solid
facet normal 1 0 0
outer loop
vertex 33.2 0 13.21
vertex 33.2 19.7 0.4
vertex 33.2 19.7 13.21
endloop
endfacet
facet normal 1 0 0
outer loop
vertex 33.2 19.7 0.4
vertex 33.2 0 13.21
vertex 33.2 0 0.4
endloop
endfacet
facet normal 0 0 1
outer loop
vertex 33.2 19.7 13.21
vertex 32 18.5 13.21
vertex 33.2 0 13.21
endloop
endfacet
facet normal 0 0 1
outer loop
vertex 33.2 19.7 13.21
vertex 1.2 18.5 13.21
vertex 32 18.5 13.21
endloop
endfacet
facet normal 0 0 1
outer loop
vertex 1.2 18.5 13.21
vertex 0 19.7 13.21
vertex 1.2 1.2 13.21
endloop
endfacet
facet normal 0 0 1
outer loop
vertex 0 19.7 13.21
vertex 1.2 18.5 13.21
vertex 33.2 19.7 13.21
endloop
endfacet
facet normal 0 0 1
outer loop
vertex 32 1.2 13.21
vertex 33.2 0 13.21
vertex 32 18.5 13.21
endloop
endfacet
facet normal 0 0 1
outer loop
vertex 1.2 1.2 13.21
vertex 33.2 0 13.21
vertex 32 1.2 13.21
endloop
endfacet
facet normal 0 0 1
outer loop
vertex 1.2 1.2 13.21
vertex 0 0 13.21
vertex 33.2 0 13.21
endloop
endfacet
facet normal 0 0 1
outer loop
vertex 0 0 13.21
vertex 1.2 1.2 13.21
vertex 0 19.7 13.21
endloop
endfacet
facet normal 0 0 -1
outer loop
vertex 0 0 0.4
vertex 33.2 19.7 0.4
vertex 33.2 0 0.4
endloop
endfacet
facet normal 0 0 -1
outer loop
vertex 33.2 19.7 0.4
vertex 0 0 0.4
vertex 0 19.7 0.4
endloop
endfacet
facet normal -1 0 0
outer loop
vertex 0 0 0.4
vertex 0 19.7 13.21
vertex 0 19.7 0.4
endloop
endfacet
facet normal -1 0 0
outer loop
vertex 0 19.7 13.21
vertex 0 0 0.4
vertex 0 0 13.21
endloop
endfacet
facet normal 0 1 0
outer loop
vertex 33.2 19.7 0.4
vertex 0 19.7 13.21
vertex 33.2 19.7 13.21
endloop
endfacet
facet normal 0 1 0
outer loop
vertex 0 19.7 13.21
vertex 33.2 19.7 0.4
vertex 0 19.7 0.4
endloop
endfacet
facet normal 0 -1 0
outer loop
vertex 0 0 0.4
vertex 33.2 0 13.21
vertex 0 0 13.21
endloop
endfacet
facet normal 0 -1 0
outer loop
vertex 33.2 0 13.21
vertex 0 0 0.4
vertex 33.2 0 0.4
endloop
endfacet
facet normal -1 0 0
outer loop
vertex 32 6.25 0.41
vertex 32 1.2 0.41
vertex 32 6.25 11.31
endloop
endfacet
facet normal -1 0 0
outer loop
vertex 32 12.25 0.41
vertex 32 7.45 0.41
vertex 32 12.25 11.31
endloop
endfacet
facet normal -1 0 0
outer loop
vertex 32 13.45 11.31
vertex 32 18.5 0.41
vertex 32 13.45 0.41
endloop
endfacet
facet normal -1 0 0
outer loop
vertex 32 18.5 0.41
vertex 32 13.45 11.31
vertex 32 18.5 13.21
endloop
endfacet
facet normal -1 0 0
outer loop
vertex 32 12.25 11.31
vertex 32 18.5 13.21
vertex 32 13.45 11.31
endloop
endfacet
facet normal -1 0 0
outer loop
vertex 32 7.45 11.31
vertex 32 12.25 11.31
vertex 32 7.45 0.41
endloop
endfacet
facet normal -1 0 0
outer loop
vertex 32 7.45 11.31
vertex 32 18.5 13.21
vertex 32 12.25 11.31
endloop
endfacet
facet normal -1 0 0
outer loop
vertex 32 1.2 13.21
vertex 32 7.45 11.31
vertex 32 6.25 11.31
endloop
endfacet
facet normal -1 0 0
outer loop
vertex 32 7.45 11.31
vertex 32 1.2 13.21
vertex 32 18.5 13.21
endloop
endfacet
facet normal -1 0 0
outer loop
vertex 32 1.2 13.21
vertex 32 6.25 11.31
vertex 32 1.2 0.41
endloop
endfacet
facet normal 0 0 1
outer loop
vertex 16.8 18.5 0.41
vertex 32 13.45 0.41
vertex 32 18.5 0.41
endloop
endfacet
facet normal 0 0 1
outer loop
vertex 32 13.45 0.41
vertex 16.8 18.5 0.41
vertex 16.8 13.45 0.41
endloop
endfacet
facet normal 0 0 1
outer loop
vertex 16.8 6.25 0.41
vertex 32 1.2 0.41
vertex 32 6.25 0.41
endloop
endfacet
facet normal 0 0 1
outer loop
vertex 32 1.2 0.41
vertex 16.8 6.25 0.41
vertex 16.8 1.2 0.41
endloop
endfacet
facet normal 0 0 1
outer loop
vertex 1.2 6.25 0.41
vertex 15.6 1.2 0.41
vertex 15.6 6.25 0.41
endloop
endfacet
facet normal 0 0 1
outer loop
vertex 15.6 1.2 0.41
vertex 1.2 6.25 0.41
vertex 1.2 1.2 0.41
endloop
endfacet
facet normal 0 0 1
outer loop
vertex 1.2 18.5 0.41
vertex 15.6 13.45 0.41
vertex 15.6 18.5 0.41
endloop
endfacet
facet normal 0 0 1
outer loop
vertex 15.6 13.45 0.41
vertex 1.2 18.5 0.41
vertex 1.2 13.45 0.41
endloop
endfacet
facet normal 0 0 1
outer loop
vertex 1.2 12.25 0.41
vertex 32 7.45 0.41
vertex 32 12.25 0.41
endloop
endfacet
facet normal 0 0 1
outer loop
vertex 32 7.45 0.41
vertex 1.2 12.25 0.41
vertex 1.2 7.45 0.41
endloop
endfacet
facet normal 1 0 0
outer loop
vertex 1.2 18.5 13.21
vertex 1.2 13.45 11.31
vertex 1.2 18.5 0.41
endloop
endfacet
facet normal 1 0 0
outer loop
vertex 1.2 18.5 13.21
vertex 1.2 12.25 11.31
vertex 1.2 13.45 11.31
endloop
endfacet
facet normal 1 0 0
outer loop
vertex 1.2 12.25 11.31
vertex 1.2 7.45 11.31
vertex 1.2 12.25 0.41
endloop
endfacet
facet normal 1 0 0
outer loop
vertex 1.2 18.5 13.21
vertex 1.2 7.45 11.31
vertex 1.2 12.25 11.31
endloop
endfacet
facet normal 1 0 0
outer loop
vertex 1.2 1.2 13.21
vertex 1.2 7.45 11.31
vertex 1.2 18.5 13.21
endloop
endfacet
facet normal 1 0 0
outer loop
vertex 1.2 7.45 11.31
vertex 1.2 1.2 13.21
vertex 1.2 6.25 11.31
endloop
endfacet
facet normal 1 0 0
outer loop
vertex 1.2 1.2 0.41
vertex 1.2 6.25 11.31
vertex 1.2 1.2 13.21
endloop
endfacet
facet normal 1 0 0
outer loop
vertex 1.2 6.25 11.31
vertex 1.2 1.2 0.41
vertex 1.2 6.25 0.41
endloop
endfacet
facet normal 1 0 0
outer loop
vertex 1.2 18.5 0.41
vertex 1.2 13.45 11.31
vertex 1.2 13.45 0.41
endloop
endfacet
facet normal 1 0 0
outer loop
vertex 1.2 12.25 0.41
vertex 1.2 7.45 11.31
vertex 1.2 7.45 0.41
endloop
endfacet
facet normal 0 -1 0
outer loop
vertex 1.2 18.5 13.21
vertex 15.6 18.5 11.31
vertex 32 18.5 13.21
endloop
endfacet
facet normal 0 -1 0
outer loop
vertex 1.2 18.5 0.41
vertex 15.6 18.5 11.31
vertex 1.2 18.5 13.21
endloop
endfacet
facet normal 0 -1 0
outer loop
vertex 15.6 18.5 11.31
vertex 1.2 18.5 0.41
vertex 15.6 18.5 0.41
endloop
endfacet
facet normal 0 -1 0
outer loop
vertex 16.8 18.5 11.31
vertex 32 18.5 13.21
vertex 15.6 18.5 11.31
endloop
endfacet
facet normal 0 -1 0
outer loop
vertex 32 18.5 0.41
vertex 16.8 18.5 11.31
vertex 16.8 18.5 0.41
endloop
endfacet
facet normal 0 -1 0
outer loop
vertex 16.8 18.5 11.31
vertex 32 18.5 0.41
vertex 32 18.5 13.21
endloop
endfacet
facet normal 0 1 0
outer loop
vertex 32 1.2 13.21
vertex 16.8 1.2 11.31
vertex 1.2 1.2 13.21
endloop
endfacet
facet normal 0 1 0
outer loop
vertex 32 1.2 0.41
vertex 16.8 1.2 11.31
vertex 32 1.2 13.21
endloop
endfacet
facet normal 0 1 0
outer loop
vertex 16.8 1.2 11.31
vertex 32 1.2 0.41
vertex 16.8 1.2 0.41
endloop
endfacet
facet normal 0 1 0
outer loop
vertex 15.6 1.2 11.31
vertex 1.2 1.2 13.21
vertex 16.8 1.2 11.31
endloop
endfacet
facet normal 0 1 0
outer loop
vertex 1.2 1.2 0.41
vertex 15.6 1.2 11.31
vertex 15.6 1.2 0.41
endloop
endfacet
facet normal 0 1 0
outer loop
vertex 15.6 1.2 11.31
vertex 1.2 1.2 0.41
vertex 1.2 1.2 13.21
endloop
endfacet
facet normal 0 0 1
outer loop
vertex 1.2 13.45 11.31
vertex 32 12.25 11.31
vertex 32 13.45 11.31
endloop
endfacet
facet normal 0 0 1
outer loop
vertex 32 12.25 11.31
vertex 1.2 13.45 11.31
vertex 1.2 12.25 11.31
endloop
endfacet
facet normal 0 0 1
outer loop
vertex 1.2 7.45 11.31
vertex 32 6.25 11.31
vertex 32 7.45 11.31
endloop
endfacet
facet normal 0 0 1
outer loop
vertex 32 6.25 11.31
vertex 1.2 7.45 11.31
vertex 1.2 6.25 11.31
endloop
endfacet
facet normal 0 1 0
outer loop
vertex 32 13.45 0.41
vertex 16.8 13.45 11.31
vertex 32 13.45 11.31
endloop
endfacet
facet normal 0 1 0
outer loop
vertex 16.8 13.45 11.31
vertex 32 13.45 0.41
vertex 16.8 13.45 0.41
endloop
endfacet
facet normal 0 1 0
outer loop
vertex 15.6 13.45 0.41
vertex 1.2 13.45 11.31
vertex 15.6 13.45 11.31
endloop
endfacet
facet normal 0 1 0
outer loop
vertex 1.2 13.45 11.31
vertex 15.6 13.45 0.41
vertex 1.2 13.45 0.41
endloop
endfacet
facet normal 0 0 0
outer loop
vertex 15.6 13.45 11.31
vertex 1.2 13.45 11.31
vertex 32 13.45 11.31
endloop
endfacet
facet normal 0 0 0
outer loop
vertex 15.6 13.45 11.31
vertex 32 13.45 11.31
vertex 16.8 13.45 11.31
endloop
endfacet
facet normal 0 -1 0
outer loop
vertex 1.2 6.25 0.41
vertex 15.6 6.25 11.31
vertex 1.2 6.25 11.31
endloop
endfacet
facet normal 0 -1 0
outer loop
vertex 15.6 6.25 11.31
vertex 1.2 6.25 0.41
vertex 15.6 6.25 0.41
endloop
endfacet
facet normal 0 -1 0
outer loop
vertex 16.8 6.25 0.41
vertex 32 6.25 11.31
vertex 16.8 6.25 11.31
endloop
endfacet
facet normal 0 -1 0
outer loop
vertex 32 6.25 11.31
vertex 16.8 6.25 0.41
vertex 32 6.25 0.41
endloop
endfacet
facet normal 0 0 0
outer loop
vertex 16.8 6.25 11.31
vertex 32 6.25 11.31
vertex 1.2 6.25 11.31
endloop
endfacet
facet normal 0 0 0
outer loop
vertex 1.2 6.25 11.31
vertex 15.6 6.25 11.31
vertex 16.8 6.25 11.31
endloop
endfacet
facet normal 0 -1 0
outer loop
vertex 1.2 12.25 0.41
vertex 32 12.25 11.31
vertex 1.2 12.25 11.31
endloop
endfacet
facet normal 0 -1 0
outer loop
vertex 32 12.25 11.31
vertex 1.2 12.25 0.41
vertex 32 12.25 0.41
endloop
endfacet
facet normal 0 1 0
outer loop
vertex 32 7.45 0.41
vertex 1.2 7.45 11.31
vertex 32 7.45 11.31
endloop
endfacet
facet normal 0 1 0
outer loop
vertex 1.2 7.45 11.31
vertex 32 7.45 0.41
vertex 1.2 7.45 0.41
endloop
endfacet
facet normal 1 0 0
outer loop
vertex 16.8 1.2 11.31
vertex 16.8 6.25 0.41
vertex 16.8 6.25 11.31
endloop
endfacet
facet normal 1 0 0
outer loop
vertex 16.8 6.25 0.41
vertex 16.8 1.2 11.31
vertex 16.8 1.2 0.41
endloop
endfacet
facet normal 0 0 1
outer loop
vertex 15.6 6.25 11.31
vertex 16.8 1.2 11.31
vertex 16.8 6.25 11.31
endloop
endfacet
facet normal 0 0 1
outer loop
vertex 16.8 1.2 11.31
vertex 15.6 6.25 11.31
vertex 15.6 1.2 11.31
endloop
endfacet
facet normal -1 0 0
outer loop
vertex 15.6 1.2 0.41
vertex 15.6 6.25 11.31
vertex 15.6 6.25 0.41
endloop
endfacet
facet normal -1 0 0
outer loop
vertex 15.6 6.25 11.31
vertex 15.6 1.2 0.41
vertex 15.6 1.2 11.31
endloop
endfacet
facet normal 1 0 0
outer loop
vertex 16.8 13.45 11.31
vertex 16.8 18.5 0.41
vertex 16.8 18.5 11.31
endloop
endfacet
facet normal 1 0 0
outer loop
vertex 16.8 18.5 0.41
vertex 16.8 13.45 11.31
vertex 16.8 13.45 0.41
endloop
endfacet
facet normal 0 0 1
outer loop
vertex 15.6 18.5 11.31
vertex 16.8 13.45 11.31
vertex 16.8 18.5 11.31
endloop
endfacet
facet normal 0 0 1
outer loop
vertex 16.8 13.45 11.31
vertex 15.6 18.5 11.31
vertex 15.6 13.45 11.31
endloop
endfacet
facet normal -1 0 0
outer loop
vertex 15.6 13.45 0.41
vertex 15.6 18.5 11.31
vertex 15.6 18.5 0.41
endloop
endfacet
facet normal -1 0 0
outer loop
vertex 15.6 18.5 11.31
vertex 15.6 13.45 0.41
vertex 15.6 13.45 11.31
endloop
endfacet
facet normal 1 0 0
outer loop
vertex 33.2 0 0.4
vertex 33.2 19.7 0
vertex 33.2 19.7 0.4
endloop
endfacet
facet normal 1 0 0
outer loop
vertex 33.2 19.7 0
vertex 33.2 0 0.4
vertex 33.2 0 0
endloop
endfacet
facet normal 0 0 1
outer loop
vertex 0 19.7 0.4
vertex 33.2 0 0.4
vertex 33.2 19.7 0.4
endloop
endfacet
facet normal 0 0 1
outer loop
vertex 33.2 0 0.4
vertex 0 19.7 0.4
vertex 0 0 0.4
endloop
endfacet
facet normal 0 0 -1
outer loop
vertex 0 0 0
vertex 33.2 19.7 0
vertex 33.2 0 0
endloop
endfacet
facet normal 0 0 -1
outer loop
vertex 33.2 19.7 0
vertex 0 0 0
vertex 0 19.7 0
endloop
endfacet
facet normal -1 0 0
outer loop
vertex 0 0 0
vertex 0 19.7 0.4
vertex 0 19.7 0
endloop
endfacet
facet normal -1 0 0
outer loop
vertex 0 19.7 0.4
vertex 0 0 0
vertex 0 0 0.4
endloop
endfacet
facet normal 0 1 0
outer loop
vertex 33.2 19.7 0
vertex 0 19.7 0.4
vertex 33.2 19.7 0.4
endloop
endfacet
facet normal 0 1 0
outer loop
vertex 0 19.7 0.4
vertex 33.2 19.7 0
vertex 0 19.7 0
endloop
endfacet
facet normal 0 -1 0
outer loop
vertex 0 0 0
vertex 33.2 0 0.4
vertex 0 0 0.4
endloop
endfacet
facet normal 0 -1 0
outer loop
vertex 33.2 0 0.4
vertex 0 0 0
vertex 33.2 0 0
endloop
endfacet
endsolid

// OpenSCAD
// file: ../../Base/Boxes.scad
// Fischertechnik Box Foundation
// Pre-designed Boxes

use <Constants.scad>

include <PlacementOptions.scad>

box190Width = 190;
box190Depth = 130;
box130Width = 130;
box130Depth = 95;
boxUsageHeight = 33.9;
boxWallThickness = 2.4;
boxBaseThickness = 1.0;
boxWebWidth = 3.0;

// getBoxWallThickness()
// Gets the wall thickness of a Fischertechnik Box

function getBoxWallThickness() = boxWallThickness;

// Gets the usable height of a fischertechnik box
function getBoxUsageHeight() = boxUsageHeight;

// Gets the thickness of the Fischertechnik box base.
function getBoxBaseThickness() = boxBaseThickness;

// Gets the width of a box web
function getBoxWebWidth() = boxWebWidth;

// Gets the usable inner space of a Box 190 as an x/y-list
function getBox190Space() = [
    box190Width - 2*getBoxWallThickness(), 
    box190Depth - 2*getBoxWallThickness() ];

// Imports the Fischertechnik empty box 130x190 mm and places it at position 0,0
// 190x130 are the outer sizes, the inner space is slightly smaller. Use getBox190Space() to get the inner sizes.
// This module needs the STL file "Fischertechnik Box 130x190.stl" in the library path.
// The box is positioned that the usable inner space is at the 0,0,0 position. The

module Box190() {
    translate([-getBoxWallThickness(),-getBoxWallThickness(),-getBoxBaseThickness()])
        import("Fischertechnik Box 130x190.stl", convexity=3);
}

// Gets the usable inner space of a Box 130 as an x/y-list
function getBox130Space() = [
    box130Width - 2*getBoxWallThickness(), 
    box130Depth - 2*getBoxWallThickness() ];

// Imports the Fischertechnik empty box 95x130 mm and places it at position 0,0
// 190x130 are the outer sizes, the inner space is slightly smaller. Use getBox190Space() to get the inner sizes.
// This module needs the STL file "Fischertechnik Box 95x130.stl" in the library path.
// The box is positioned that the usable inner space is at the 0,0,0 position. The

module Box130() {
    translate([-getBoxWallThickness(),-getBoxWallThickness(),-getBoxBaseThickness()])
        import("Fischertechnik Box 95x130.stl", convexity=3);
}

// Creates a web at the specified box walls
// corner 0 = LowerLeft, 1 = UpperLeft, 2 = UpperRight, 3 = LowerRight
// side 0 = LeftOfCorner, 1 = RightOfCorner
// distance = Distance in mm from the corner
// box = inner width and depth of the box (default: Box 190)
// webWidth = length of the web (default is 3 mms)
// webThickness = thickness of the web (default is 1 mm)

module BoxWeb(corner, side, distance, box=getBox190Space(), webWidth=getBoxWebWidth(), webThickness=1.0) {
    sink = getBoxWallThickness()/2;

    width = (corner % 2 == 0) ? 
            (side == LeftOfCorner ? webWidth : webThickness) :
            (side == LeftOfCorner ? webThickness : webWidth);

    depth = (corner % 2 == 0) ? 
            (side == RightOfCorner ? webWidth : webThickness) :
            (side == RightOfCorner ? webThickness : webWidth);
    
    xDiff = corner == LowerLeft ? 
                (side == LeftOfCorner ? -sink : distance) :
            (corner == UpperLeft ?                
                (side == LeftOfCorner ? distance : -sink) :
            (corner == UpperRight ?
                (side == LeftOfCorner ? box.x-webWidth+sink : box.x-distance-webThickness) :
                (side == LeftOfCorner ? box.x-distance-webThickness: box.x-webWidth+sink)));

    yDiff = corner == LowerLeft ? 
                (side == RightOfCorner ? -sink : distance) :
            (corner == UpperLeft ?
                (side == RightOfCorner ? box.y-distance : box.y-webWidth+sink) :
            (corner == UpperRight ?
                (side == RightOfCorner ? box.y-webWidth+sink : box.y-distance) :
                (side == RightOfCorner ? distance : -sink)));
    
    translate([xDiff, yDiff, -getExcess()])
        cube([width, depth, boxUsageHeight + 2*getExcess()]);
}
// file: ../../Base/Rotation.scad
// Fischertechnik Box Foundation
// Geometry Helpers Rotation

include <PlacementOptions.scad>

// getRotatedSpace(space, rotation=NoRotation)
// Rotates the space dependent on the specified rotation

function getRotatedSpace(space, rotation=NoRotation) = [
    (rotation == Rotate90 || rotation == Rotate270) ? space.y : space.x,
    (rotation == Rotate90 || rotation == Rotate270) ? space.x : space.y
];

// Rotates the given space around the fixed left lower corner
// space = the space the children needs as width/depth list [width,depth]
// rotation = 0 Rotate0 degrees, 1 Rotate90 degrees, 2 Rotate180 degrees, 3 Rotate270 degrees (equivalent to -90)

module RotateFix(space, rotation=Rotate0) {
    dy = (rotation == Rotate0 || rotation == Rotate270) ? 0 :
        (rotation == Rotate90) ? space.x :
        space.y;
    dx = (rotation < Rotate180) ? 0 :
        (rotation == Rotate180) ? space.x :
        space.y;
    
    translate([dx, dy, 0])
        rotate([0, 0, rotations[rotation]])
            children();
}
// file: ../../Base/Alignment.scad
// Fischertechnik Box Foundation
// Geometry Helpers Alignment

include <PlacementOptions.scad>

// getAlignedX(elementWidth, spaceWidth, align=AlignRight, offset=0)
// Gets the aligned X offset of an element with the given
// width in the given space.
// elementWidth = The width of the element to positon
// spaceWidth = The space where the element should be aligned
// align = 0 AlignLeft, 1 AlignCenter, 2 AlignRight
// offset = an optional offset from the aligned position. When
// aligned left or centered, then positive values are in X direction.
// When aligned right then positive values are in negative X direction.

function getAlignedX(elementWidth, spaceWidth, align=AlignRight, offset=0) =
    (align == AlignLeft) ?
        offset :
        ((align == AlignCenter) ?
        (spaceWidth - elementWidth)/2 + offset :
        spaceWidth - offset - elementWidth);

// getAlignedY(elementDepth, spaceDepth, align=AlignTop, offset=0)
// Gets the aligned Y offset of an element with the given
// depth in the given space.
// elementDepth = The depth of the element to positon
// spaceDepth = The space where the element should be aligned
// align = 0 AlignBottom, 1 AlignCenter, 2 AlignTop
// offset = an optional offset from the aligned position. When
// aligned bottom or centered, then positive values are in Y direction.
// When aligned top then positive values are in negative Y direction.

function getAlignedY(elementDepth, spaceDepth, align=AlignTop, offset=0) =
    (align == AlignBottom) ?
        offset :
        ((align == AlignCenter) ?
        (spaceDepth - elementDepth)/2 + offset :
        spaceDepth - offset - elementDepth);
// file: ../../Base/PlacementOptions.scad
// Fischertechnik Box Foundation
// Placement Options

// Alignment
NoAlign = 0;
AlignLeft = 1;
AlignBottom = 2;
AlignCenter = 3;
AlignRight = 4;
AlignTop = 5;

// Element rotation degree steps
rotations = [0, -90, -180, -270];

// Rotation
NoRotation = 0;
Rotate0 = 0;
Rotate90 = 1;
Rotate180 = 2;
Rotate270 = 3;

// Docking (seen from above)
NoDock = -1;
DockLeft = 0;
DockTop = 1;
DockRight = 2;
DockCorner = 2;
DockBottom = 3;

// Web corners
LowerLeft = 0;
UpperLeft = 1;
UpperRight = 2;
LowerRight = 3;

// Web position relative to corner
LeftOfCorner = 0;
RightOfCorner = 1;
// file: ../../Base/Placement.scad
// Fischertechnik Box Foundation
// Geometry Helpers Placement

use <Constants.scad>
use <Alignment.scad>
use <Rotation.scad>
use <Boxes.scad>

include <PlacementOptions.scad>

// Place(x=0, y=0, elementSpace=[0,0], alignX=AlignLeft, alignY=AlignBottom, rotation=Rotate0, boxSpace=getBox190Space())
// Places the child at the specified position
// y = Y-Position. This is a relative position when an X aligment is specified.
// x = X-Position. This is a relative position when an Y aligment is specified.
// elementSpace = space of the element to be placed [x,y]
// alignX = -1=NoAlign, 0 AlignLeft, 1 AlignCenter, 3 AlignRight (elementSpace and boxSpace required!)
// alignY = -1=NoAlign, 2 AlignBottom, 1 AlignCenter, 4 AlignTop (elementSpace and boxSpace required!)
// rotation = 0 Rotate0 0 degrees, 1 Rotate90 90 degrees, 
// 2 Rotate180 180 degrees, 3 Rotate270 270 degrees (equivalent to -90)
// boxSpace = Inner space of the box where the placement occurs [x,y] - default is Box 190x130 inner space

module Place(x=0, y=0, elementSpace=[0,0], 
  alignX=AlignLeft, alignY=AlignBottom, 
  rotation=NoRotation, boxSpace=getBox190Space()) {

    module Position(x, y, space, rotation=Rotate0) {
        translate([x, y, 0])
            RotateFix(space, rotation)
                children();
    }

    space = getRotatedSpace(elementSpace, rotation);
    alignedX = getAlignedX(space.x, boxSpace.x, alignX, x);
    alignedY = getAlignedY(space.y, boxSpace.y, alignY, y);
    Position(alignedX, alignedY, elementSpace, rotation)
        children();
}

// Center(space=getBox130Space(), elementSpace=[0,0])
// space = Space where the children is centered. For cylinder use centered=true and no elementSpace.
// elementSpace = space of the element to be centered [x,y]

module Center(space=getBox190Space(), elementSpace=[0,0]) {
    translate([(space.x - elementSpace.x) / 2, (space.y - elementSpace.y) / 2])
        children(0);
}

// CenterHorizontal(width=0, y=0, offset=0, space=getBox130Space())
// space = Space where the children is centered. For cylinder use centered=true and no elementSpace.
// elementSpace = space of the element to be centered [x,y]

module CenterHorizontal(width=0, y=0, offset=0, space=getBox190Space()) {
    translate([(space.x - width) / 2 + offset, y])
        children(0);
}

// CenterVertical(depth=0, x=0, offset=0, space=getBox130Space())
// space = Space where the children is centered. For cylinder use centered=true and no elementSpace.
// elementSpace = space of the element to be centered [x,y]

module CenterVertical(depth=0, x=0, offset=0, space=getBox190Space()) {
    translate([x, (space.y - depth) / 2 + offset])
        children(0);
}
// file: ../../Elements/AxisClip10.scad
// Fischertechnik Box Library
// Axis for clip 10
// 31023

use <../ModelBase/Simple.scad>

width = 12;
depth = 12;
height = 23;

// getAxisClip10Space()
// Gets the space of a frame for a clip 10 with spring ring (mot2)

function getAxisClip10Space() = [width, depth, height];

// AxisClip10()
// Axis for clip 10 with spring ring (mot2)

module AxisClip10() {
    LeveledAxisWithSpace(height, height-10, getAxisClip10Space());
}

// Tests
color("lightgray")
AxisClip10();
// file: ../../Base/Constants.scad
// Fischertechnik Box Foundation
// Constants

// Constant values necessary for multiple elements

// Base constants
dividerThickness = 1.2;
excess = 0.01;
fragments = 90;
tolerance = 0.8;

// Gets the thickness of a divider 
function getDividerThickness() = dividerThickness;

// Gets the excess that is used to merge walls into each other
function getExcess() = excess;

// Gets amount of fragments of a cylinder
function getFragments() = fragments;

// Gets the inner tolerance of a frame to each side
function getTolerance() = tolerance;


// Fischertechnik specific constants
axisDiameter = 4;
axisBottomDiameter = axisDiameter + 1;
standardEdgeDistance = 2.5;
standardWebDistance = 11.5;
standardCornerLength = 15;
tubeWallFactor = 0.8;

// Gets axis diameter
function getAxisDiameter() = axisDiameter;

// Gets axis bottom diameter for thicker part at the bottom
function getAxisBottomDiameter() = axisBottomDiameter;

// gets the standard distance to the wall of the box for dockable frames with webs
function getStandardEdgeDistance() = standardEdgeDistance;

// gets the standard distance of each web to the corner of the dockable frame
function getStandardWebDistance() = standardWebDistance;

// gets the standard length of the corner walls of a dockable frame
function getStandardCornerLength() = standardCornerLength;

// gets the wall thickness of a tube.
function getTubeWallThickness() = tubeWallFactor * getDividerThickness();
// file: ../../Elements/FrameRack30.scad
// Fischertechnik Box Library
// Frame for Rack 30
// 31054

use <../Base/Constants.scad>
use <../ModelBase/Complex.scad>

width = 30;
depth = 15;
height = 12.8;
factor = 1; // 30 mm

// getFrameRack30Space(count=1)
// Gets the space for a frame for count racks 30 in one row.

function getFrameRack30Space(count=1) = getFrameRackSpace(factor*count, 1);

// FrameRack(count)
// Frame for rack 30. The racks 30 are ordered in line.
// count = Count of racks in one row

module FrameRack30(count=1) {
    FrameRack(factor*count, 1);
}

// Test
color("lightgray")
FrameRack30();
// file: ../TestPrint.scad
// 3D Print Test Base

use <../Base/Constants.scad>

use <../Elements/AxisClip10.scad>

module TestPrint(elementSpace) {
    cube([elementSpace.x, elementSpace.y, 0.4]);
    translate([0,0,0.4+getExcess()]) {
        children();
    }
}

TestPrint(getAxisClip10Space())
    AxisClip10();
// main file
// 3D Print Test Base
// FrameRack30

use <../TestPrint.scad>
use <../../Elements/FrameRack30.scad>

TestPrint(getFrameRack30Space())
    FrameRack30();
